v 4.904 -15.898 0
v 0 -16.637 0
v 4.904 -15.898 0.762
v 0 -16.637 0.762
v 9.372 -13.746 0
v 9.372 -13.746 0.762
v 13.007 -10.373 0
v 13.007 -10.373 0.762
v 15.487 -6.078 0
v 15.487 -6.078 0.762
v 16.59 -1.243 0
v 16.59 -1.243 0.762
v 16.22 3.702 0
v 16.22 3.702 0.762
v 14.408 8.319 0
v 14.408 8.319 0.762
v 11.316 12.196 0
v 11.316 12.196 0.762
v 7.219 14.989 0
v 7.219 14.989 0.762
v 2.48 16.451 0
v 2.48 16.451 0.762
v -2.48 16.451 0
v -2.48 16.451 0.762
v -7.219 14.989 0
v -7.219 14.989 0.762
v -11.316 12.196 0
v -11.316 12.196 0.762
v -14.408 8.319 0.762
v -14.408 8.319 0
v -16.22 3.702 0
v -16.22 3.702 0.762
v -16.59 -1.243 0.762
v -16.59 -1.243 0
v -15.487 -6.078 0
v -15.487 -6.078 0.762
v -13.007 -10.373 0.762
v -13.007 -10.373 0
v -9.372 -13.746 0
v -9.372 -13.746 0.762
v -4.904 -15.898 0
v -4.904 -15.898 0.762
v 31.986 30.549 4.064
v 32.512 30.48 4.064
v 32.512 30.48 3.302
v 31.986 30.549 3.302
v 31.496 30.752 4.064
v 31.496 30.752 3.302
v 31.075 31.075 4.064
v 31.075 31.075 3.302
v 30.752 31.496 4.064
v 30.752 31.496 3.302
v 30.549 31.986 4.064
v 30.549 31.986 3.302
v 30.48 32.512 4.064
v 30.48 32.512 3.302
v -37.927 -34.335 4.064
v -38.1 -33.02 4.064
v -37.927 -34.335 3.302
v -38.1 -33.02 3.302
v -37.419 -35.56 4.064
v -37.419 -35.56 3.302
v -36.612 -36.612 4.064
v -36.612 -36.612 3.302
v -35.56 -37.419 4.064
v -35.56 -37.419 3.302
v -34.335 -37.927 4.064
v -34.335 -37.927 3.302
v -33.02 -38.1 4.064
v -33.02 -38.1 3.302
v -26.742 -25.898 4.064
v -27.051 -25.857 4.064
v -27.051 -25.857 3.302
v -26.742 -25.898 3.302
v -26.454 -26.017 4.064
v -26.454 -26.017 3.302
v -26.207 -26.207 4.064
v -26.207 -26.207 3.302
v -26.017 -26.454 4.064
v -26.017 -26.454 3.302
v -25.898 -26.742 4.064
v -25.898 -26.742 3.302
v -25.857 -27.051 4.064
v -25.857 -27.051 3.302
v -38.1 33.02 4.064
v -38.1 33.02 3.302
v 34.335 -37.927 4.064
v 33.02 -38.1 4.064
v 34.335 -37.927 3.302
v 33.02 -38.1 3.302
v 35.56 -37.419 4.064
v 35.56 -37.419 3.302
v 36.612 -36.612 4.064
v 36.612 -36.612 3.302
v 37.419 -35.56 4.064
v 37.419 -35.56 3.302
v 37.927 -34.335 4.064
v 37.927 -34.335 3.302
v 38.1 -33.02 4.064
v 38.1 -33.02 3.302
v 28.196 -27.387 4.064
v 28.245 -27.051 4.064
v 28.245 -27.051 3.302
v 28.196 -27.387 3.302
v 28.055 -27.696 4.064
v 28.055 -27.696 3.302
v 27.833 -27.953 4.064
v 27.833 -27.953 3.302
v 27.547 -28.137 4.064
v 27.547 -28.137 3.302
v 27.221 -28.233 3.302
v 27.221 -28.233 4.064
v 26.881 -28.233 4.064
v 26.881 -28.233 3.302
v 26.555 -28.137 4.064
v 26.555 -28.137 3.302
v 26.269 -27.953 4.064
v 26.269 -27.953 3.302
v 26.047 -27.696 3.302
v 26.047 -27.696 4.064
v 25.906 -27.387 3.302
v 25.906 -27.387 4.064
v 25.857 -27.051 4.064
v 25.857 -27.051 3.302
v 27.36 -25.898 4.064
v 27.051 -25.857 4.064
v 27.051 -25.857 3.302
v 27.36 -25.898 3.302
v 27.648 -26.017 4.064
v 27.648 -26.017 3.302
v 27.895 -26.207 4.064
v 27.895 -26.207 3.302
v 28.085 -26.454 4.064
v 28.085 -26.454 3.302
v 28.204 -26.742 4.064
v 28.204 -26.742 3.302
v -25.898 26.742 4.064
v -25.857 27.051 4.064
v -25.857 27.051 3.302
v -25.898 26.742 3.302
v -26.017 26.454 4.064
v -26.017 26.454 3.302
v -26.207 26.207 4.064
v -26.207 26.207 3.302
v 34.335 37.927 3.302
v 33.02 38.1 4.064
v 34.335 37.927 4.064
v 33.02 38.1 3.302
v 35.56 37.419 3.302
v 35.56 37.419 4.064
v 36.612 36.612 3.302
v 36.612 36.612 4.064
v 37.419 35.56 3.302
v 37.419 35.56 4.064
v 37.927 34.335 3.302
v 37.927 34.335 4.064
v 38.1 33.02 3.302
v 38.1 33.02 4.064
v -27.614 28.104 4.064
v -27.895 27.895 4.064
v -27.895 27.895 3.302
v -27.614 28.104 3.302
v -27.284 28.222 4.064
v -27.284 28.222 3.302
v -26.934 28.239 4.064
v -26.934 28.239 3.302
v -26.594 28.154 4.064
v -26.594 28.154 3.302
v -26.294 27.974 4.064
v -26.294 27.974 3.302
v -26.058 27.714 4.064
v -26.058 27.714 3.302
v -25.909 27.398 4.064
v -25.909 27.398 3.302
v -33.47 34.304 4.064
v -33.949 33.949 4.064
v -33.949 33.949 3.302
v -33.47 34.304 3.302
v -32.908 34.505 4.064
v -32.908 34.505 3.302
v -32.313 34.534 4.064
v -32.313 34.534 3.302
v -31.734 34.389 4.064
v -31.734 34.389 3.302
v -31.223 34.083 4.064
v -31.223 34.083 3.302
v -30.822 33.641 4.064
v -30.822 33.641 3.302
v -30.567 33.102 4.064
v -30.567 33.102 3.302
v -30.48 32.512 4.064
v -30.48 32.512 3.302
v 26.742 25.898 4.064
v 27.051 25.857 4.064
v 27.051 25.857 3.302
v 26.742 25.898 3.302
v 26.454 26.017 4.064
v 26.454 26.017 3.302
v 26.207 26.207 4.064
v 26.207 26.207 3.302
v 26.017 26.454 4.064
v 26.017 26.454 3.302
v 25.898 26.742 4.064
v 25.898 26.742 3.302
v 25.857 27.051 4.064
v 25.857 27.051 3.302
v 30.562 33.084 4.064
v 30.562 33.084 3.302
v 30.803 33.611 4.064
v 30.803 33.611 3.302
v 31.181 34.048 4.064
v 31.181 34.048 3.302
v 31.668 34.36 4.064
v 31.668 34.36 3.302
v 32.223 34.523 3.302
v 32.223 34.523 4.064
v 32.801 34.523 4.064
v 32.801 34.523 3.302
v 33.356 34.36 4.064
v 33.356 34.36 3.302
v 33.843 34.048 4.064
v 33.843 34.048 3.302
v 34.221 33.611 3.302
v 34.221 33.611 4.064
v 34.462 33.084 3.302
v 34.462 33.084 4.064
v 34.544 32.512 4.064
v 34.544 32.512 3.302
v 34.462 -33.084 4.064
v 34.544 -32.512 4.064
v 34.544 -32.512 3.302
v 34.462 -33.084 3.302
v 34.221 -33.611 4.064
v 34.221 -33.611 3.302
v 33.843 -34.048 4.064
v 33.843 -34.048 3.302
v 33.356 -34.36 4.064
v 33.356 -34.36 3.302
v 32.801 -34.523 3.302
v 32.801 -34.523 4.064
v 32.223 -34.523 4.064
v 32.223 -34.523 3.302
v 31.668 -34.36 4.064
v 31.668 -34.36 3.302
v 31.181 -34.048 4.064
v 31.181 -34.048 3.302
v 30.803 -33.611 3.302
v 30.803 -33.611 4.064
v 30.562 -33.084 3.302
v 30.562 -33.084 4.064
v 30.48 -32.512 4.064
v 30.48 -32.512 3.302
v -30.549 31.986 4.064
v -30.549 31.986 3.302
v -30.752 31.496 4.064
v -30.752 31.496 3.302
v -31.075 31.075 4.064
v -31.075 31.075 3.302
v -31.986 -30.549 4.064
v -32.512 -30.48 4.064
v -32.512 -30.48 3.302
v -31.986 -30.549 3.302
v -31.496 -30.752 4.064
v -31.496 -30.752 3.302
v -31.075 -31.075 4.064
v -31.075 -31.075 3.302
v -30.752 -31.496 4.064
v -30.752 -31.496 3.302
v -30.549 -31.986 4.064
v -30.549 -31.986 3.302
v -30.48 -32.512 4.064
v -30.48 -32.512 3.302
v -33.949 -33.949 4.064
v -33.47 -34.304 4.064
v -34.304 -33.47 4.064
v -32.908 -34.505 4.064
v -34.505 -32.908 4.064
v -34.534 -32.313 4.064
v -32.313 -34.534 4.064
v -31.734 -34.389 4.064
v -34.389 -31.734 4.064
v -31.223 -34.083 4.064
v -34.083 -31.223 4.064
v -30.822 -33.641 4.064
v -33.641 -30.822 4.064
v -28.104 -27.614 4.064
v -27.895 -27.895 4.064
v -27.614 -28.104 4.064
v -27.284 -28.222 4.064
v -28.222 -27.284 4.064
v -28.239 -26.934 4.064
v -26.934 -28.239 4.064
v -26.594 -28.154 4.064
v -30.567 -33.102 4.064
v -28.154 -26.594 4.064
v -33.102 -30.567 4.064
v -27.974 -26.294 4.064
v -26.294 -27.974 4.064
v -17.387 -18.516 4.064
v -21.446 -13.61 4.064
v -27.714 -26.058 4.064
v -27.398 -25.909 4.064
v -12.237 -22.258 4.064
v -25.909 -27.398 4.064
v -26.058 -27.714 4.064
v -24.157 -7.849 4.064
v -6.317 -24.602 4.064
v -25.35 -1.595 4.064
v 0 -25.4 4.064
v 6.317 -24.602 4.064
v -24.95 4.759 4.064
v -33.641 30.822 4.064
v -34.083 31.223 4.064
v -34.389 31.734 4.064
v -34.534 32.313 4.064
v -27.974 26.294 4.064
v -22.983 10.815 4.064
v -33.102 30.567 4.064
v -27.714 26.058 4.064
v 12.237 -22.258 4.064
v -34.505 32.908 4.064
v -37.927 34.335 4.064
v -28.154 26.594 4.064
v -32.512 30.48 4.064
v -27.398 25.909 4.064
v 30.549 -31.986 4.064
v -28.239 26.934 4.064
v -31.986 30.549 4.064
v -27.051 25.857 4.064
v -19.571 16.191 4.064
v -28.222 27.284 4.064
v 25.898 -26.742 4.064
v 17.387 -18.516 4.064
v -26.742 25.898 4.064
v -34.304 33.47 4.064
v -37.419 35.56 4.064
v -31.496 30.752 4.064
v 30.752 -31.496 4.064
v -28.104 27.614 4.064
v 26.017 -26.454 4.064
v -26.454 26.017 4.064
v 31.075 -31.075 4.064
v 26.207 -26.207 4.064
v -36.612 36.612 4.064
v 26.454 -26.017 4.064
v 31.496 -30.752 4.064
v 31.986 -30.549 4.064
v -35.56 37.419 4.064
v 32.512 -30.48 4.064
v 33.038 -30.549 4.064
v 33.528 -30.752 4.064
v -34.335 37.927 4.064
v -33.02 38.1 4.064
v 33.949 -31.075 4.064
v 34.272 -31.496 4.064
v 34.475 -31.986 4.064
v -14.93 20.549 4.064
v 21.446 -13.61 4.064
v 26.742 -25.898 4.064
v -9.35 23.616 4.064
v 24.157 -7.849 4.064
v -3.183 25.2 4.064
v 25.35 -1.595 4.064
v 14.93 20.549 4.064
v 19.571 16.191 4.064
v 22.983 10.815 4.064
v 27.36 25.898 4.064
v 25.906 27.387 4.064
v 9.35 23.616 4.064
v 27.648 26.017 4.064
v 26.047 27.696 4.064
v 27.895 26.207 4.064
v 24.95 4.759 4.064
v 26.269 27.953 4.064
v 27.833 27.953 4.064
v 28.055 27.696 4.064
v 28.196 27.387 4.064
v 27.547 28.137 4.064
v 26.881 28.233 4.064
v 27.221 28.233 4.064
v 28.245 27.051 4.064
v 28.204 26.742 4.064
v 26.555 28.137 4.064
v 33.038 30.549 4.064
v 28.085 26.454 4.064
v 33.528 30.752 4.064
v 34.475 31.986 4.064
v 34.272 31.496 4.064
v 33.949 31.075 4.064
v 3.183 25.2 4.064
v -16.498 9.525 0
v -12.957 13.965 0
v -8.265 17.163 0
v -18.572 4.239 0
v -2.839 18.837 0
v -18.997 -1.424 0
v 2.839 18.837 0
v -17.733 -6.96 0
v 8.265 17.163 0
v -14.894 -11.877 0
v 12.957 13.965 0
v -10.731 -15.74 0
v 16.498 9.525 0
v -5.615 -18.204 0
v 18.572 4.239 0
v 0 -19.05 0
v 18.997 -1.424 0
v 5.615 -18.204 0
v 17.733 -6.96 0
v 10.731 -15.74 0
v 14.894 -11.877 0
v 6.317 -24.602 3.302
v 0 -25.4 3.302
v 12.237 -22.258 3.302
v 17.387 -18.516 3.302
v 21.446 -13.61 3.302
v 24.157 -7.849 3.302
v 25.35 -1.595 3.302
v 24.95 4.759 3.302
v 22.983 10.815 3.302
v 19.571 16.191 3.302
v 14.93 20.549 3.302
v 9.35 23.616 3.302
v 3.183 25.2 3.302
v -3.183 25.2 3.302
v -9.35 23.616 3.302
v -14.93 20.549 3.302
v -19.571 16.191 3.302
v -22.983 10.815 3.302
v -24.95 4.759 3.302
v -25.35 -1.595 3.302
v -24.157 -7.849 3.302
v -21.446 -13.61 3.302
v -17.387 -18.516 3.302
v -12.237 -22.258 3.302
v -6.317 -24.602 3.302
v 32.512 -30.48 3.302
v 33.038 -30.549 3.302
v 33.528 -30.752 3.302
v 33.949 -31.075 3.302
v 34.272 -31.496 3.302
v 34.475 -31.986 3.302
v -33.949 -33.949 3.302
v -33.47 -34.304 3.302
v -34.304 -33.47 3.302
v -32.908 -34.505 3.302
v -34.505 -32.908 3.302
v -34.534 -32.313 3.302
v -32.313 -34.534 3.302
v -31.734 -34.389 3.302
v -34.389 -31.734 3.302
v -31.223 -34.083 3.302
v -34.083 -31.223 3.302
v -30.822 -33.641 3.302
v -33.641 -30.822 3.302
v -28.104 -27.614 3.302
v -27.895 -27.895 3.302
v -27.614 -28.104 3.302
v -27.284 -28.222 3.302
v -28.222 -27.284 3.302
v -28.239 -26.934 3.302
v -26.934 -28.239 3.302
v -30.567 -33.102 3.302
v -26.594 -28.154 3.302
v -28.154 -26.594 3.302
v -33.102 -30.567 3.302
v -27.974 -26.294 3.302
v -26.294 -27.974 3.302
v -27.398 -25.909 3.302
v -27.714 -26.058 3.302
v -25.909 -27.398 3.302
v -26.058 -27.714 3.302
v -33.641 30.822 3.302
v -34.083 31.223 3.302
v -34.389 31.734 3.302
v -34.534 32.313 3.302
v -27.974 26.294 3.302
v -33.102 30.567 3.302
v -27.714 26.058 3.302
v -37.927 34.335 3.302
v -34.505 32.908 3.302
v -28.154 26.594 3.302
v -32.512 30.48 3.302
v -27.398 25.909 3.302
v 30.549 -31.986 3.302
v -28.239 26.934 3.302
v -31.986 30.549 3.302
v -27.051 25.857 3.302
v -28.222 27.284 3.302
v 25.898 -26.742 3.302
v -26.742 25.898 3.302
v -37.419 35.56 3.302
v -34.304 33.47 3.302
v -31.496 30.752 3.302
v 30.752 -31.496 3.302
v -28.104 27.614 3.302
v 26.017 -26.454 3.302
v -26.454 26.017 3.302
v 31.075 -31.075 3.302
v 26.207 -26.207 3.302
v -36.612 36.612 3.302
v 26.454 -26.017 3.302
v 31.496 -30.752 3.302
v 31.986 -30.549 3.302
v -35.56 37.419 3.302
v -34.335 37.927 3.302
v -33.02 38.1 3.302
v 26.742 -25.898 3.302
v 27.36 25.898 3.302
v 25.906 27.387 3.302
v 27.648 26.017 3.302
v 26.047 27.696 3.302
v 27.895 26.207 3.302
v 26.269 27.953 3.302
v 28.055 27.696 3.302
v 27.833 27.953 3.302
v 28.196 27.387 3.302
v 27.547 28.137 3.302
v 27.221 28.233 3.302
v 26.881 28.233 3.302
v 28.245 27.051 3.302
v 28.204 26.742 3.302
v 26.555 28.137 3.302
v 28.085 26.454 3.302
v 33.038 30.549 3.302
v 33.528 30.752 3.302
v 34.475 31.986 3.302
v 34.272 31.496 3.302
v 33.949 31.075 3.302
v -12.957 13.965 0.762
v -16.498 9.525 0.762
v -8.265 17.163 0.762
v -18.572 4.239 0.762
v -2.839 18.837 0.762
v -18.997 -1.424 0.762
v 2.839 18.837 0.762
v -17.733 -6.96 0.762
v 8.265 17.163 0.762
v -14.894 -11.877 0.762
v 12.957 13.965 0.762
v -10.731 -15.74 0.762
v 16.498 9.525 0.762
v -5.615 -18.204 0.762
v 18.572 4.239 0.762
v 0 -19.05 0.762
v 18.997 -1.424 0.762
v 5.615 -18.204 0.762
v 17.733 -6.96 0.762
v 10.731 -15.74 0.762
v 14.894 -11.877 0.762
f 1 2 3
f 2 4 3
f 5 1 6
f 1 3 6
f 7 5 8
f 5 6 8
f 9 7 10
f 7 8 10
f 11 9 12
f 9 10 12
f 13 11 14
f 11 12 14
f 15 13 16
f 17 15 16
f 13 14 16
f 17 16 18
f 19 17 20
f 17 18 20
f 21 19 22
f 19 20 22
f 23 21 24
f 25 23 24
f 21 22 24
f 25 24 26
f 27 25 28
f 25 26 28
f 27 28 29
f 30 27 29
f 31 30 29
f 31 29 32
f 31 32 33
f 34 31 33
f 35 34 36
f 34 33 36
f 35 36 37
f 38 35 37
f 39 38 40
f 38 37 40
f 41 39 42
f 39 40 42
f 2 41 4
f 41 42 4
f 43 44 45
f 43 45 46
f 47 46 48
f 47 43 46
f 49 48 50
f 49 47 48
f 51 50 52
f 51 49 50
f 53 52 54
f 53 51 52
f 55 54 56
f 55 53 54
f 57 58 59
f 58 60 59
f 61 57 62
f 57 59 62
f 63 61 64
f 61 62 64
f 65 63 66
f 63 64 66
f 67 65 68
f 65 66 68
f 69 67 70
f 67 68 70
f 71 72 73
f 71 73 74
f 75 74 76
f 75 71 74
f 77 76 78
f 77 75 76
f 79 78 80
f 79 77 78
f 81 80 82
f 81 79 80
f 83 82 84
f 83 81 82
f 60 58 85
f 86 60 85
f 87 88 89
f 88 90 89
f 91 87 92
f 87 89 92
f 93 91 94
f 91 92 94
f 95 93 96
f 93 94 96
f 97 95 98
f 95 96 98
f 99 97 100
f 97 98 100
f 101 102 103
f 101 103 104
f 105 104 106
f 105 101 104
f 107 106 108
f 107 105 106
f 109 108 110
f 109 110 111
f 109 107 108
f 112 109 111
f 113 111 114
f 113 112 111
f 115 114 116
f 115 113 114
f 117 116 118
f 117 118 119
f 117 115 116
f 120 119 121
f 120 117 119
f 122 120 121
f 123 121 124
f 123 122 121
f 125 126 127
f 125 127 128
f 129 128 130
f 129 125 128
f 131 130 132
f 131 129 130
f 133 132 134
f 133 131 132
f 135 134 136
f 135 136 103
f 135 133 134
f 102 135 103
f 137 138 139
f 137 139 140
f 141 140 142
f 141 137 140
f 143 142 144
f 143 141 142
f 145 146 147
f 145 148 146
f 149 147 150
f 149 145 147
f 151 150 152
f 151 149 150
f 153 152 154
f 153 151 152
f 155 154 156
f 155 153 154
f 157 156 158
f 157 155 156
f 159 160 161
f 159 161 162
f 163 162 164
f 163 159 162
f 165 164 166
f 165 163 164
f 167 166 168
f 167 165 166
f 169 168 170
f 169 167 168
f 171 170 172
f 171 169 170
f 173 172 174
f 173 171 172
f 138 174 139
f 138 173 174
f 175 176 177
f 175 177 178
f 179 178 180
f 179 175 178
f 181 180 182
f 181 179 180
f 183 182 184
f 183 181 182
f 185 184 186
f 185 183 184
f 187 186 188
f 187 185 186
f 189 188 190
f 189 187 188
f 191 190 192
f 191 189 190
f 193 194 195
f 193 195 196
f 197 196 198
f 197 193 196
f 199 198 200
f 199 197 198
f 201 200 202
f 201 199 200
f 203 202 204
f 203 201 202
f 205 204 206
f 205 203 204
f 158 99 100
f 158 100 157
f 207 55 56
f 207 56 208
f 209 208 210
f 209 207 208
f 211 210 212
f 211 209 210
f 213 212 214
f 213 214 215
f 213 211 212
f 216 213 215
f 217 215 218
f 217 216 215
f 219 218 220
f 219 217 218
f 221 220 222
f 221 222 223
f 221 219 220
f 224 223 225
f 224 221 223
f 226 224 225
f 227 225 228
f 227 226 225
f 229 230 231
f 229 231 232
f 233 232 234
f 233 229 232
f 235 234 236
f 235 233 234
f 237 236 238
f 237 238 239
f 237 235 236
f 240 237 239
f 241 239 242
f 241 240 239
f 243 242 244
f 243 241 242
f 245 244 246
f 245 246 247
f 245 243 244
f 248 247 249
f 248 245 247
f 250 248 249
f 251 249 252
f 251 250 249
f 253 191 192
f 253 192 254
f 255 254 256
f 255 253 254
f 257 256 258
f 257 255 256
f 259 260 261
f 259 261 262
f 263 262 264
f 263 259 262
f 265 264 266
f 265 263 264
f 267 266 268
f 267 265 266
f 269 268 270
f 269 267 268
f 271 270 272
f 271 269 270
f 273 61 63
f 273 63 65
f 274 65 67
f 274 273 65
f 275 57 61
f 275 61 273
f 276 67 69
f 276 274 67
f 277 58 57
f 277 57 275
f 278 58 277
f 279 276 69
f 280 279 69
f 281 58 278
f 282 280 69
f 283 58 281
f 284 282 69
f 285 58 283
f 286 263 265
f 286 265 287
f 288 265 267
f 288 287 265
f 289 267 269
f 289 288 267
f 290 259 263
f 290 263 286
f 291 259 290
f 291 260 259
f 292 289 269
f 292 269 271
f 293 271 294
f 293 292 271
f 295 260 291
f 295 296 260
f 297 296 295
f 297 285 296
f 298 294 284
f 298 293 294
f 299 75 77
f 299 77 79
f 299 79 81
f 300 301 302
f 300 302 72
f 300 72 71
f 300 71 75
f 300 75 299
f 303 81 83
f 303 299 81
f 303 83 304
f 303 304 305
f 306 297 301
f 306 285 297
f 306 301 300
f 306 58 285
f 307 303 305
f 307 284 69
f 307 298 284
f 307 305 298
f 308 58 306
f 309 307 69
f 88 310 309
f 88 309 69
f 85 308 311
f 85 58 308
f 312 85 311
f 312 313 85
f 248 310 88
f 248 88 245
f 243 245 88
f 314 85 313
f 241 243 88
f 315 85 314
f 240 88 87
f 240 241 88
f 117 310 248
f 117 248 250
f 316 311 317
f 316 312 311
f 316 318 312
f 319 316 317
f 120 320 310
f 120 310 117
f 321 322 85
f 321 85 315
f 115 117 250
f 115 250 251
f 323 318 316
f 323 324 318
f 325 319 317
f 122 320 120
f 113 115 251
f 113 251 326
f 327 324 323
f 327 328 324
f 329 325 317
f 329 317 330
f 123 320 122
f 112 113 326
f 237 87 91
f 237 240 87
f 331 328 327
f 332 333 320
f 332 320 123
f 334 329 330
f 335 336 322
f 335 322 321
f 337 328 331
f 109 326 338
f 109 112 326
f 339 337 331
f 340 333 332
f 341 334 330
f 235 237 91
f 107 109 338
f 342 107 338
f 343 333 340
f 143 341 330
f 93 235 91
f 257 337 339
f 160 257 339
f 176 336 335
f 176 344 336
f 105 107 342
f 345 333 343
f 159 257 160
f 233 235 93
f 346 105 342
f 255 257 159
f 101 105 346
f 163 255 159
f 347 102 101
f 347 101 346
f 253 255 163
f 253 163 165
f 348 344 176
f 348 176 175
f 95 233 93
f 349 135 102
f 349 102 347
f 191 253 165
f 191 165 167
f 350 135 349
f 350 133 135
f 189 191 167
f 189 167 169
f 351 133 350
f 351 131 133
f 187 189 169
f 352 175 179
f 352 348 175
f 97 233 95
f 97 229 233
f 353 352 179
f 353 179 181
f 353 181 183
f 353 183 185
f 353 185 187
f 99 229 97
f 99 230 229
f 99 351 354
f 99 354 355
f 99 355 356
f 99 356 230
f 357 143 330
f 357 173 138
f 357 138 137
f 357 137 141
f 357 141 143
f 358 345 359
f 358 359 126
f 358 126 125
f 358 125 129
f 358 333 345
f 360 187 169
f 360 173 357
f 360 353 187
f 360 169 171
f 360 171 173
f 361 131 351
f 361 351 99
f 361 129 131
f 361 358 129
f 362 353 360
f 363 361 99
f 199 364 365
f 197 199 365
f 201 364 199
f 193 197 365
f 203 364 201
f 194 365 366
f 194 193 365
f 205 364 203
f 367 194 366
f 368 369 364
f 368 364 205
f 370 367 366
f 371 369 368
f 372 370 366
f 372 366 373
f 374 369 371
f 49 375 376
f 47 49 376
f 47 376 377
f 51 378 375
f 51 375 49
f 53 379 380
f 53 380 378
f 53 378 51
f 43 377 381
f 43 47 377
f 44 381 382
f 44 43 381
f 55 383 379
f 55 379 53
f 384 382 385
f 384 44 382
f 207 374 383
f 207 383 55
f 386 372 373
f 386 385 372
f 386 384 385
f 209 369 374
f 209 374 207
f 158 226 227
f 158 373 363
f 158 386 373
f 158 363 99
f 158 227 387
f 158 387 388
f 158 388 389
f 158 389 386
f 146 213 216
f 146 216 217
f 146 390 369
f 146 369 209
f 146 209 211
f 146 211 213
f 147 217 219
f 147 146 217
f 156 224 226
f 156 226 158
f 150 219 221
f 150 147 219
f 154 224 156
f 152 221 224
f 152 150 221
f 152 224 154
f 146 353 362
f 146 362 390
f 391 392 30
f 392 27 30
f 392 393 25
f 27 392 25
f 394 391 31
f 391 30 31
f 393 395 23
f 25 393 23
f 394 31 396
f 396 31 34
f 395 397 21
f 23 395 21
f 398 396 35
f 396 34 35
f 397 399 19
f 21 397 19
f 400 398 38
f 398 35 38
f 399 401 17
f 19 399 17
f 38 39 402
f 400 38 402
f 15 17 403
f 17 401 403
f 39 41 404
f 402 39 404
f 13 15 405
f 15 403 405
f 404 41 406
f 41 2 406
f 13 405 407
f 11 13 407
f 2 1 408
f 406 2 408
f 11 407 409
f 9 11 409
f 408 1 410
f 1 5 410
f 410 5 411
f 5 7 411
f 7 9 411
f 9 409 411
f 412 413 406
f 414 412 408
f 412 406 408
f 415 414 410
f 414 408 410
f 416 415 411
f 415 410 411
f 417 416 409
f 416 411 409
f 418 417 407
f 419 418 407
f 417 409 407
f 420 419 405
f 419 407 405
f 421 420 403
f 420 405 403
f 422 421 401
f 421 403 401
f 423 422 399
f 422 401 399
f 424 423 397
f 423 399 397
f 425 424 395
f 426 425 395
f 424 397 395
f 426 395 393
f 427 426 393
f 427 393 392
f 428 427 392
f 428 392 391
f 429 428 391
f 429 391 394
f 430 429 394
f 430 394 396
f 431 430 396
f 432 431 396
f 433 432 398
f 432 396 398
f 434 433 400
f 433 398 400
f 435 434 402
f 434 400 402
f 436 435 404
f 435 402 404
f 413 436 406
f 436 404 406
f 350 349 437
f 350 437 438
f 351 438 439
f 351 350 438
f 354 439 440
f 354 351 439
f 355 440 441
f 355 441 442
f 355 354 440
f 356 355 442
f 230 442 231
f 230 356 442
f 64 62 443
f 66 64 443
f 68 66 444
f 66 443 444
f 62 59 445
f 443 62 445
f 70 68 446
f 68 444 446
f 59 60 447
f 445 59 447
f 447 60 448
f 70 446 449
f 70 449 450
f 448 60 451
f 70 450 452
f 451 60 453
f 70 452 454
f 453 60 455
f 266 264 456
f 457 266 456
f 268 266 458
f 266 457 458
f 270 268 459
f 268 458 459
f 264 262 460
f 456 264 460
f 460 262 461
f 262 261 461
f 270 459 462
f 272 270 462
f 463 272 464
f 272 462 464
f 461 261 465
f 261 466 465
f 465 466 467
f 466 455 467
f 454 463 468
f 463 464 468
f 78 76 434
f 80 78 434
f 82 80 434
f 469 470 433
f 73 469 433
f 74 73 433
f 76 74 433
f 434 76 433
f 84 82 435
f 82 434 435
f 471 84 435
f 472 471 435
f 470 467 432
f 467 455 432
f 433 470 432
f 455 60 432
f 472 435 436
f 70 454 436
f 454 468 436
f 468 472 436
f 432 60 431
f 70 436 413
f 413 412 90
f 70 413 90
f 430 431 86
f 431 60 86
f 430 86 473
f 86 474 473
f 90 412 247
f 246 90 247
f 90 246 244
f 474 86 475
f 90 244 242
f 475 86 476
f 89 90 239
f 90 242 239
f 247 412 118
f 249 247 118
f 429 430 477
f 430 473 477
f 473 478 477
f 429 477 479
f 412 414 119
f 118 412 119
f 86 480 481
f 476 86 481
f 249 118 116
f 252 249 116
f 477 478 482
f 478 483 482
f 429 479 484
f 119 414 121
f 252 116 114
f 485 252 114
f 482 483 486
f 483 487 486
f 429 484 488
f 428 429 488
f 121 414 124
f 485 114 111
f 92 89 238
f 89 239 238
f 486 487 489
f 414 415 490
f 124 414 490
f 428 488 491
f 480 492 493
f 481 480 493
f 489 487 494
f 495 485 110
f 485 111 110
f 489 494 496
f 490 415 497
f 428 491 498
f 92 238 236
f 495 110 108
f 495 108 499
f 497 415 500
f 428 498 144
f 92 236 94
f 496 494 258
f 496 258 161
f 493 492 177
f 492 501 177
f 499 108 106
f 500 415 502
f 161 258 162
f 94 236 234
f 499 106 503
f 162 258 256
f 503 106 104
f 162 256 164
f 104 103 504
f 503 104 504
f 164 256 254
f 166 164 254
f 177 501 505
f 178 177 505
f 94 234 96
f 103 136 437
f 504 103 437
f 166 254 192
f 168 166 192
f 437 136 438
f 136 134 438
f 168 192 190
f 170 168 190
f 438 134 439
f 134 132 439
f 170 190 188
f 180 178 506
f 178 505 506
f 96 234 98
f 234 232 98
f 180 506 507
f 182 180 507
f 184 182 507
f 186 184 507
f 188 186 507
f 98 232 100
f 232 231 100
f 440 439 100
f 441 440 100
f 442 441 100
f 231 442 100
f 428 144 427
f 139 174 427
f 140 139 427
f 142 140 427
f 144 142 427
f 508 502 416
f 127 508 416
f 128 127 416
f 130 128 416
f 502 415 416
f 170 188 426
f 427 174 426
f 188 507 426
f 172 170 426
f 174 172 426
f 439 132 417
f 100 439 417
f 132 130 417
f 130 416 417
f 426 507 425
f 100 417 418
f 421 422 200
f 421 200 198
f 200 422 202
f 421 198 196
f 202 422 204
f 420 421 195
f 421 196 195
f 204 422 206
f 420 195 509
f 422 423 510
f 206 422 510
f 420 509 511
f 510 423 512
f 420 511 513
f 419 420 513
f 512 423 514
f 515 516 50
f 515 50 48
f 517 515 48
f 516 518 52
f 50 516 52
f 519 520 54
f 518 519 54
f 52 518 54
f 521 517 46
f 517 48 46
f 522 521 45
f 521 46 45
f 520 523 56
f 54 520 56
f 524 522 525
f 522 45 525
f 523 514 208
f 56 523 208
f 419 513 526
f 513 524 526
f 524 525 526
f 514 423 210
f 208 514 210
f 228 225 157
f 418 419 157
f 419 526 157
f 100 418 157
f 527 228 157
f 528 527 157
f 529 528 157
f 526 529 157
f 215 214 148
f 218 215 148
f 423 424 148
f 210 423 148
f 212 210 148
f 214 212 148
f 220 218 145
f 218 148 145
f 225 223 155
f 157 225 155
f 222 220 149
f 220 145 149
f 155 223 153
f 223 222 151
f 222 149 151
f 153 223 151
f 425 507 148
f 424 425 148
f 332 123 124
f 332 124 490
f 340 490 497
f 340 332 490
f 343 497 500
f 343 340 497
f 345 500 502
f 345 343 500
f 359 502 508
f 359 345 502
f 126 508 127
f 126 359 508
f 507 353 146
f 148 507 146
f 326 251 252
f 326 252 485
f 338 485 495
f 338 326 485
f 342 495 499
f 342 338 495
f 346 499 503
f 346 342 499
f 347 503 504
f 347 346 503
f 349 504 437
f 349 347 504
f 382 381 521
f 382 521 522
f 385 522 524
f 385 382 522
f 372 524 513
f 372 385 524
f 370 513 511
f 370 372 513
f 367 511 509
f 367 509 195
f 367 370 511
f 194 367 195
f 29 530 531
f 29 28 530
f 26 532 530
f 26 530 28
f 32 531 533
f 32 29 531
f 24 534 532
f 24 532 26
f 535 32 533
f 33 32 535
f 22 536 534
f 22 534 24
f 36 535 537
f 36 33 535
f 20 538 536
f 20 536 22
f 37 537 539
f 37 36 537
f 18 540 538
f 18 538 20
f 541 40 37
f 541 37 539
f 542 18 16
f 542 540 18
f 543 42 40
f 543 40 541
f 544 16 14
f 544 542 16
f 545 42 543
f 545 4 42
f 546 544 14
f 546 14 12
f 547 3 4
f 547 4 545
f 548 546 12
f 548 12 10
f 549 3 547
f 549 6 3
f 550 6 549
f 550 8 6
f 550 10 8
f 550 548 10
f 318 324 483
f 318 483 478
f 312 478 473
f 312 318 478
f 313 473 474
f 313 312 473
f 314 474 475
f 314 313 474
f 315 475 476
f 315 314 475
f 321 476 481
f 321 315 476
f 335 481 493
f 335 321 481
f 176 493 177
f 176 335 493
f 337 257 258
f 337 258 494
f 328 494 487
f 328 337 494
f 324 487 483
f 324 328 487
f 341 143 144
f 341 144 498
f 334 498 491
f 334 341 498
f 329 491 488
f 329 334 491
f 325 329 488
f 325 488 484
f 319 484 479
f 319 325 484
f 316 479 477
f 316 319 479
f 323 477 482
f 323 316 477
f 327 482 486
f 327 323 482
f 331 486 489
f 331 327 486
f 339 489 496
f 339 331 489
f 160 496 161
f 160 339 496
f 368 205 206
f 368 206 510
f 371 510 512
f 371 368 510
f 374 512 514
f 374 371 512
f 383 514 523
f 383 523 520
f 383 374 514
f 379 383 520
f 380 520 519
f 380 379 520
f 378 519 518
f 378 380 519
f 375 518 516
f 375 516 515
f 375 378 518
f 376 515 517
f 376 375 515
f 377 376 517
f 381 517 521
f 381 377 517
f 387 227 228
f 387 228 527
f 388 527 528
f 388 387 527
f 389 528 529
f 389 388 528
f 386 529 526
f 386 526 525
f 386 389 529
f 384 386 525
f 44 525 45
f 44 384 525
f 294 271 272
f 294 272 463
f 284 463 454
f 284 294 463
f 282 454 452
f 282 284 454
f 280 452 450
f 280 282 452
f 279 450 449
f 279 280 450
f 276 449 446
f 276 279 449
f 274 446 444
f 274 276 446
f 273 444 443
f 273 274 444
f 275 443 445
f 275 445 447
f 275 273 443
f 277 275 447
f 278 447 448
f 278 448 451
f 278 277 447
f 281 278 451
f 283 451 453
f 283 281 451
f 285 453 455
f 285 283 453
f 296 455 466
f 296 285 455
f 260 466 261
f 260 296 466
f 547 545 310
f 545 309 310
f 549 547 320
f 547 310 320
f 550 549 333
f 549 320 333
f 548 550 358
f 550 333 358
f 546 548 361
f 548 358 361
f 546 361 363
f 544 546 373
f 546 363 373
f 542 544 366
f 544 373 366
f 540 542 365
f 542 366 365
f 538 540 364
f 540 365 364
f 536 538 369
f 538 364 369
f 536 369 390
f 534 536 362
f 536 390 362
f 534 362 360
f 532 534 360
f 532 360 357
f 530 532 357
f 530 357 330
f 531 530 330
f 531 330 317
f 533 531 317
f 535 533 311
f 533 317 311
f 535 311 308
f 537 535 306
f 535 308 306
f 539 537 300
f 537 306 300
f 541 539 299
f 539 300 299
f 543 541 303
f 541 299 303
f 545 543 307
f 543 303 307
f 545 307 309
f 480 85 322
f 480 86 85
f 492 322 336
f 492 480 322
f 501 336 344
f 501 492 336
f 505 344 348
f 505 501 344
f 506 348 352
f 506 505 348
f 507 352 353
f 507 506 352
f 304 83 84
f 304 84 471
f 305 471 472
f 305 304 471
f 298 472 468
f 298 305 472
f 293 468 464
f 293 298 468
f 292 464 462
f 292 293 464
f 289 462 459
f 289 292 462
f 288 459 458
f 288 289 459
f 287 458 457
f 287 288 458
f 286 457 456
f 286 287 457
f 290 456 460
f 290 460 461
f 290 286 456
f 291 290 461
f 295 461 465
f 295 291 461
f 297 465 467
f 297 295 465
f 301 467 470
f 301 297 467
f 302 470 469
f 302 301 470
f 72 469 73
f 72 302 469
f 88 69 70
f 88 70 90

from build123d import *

# Parameters (mm, degrees)
F0_W     = 5.08
F0_H     = 0.762
F0_W_2   = 2.413
F2_W     = 76.2
F2_H     = 76.2
F3_DEPTH = 0.762
F4_R     = 5.08


with BuildPart() as f1:
    # F0 (on Right) → F1 (revolve)
    with BuildSketch(Plane.YZ):
        with Locations((-27.94, 3.683)):
            Rectangle(F0_W, F0_H)
        Polygon((-25.4, 3.302), (-19.05, 0), (-19.05, 0.762), (-25.4, 4.064), align=None)
        with Locations((-17.8435, 0.381)):
            Rectangle(F0_W_2, F0_H)
    revolve(axis=Axis((0, 0, 0.2757511821), (0, 0, 1)))

    # F2 (on face) → F3 (join, through all)
    with BuildSketch(Plane.XY.offset(4.064)):
        Rectangle(F2_W, F2_H)
        with BuildLine():
            ThreePointArc((-32.512, 30.48), (-34.3893232101, 31.7343872654), (-33.9488409794, 33.9488409794))
            ThreePointArc((-33.9488409794, 33.9488409794), (-31.7343872654, 34.3893232101), (-30.48, 32.512))
            Line((-30.48, 32.512), (30.48, 32.512))
            ThreePointArc((30.48, 32.512), (32.512, 34.544), (34.544, 32.512))
            ThreePointArc((34.544, 32.512), (33.9488409794, 31.0751590206), (32.512, 30.48))
            Line((32.512, 30.48), (32.512, -30.48))
            ThreePointArc((32.512, -30.48), (33.9488409794, -31.0751590206), (34.544, -32.512))
            ThreePointArc((34.544, -32.512), (32.512, -34.544), (30.48, -32.512))
            Line((30.48, -32.512), (-30.48, -32.512))
            ThreePointArc((-30.48, -32.512), (-33.9488409794, -33.9488409794), (-32.512, -30.48))
            Line((-32.512, -30.48), (-32.512, 30.48))
        make_face(mode=Mode.SUBTRACT)
        with BuildLine():
            Line((30.48, 32.512), (-30.48, 32.512))
            ThreePointArc((-30.48, 32.512), (-30.6346767899, 31.7343872654), (-31.0751590206, 31.0751590206))
            ThreePointArc((-31.0751590206, 31.0751590206), (-31.7343872654, 30.6346767899), (-32.512, 30.48))
            Line((-32.512, 30.48), (-32.512, -30.48))
            ThreePointArc((-32.512, -30.48), (-31.0751590206, -31.0751590206), (-30.48, -32.512))
            Line((-30.48, -32.512), (30.48, -32.512))
            ThreePointArc((30.48, -32.512), (31.0751590206, -31.0751590206), (32.512, -30.48))
            Line((32.512, -30.48), (32.512, 30.48))
            ThreePointArc((32.512, 30.48), (31.0751590206, 31.0751590206), (30.48, 32.512))
        make_face()
        with BuildLine():
            ThreePointArc((-27.051, 25.8572), (-28.1539273859, 26.5941525184), (-27.8951440754, 27.8951440754))
            ThreePointArc((-27.8951440754, 27.8951440754), (-26.5941525184, 28.1539273859), (-25.8572, 27.051))
            Line((-25.8572, 27.051), (-14.0454191465, 27.051))
            ThreePointArc((-14.0454191465, 27.051), (0, 30.48), (14.0454191465, 27.051))
            Line((14.0454191465, 27.051), (25.8572, 27.051))
            ThreePointArc((25.8572, 27.051), (27.051, 28.2448), (28.2448, 27.051))
            ThreePointArc((28.2448, 27.051), (27.8951440754, 26.2068559246), (27.051, 25.8572))
            Line((27.051, 25.8572), (27.051, 14.0454191465))
            ThreePointArc((27.051, 14.0454191465), (29.6103434631, 7.2289667311), (30.48, 0))
            ThreePointArc((30.48, 0), (29.6103434631, -7.2289667311), (27.051, -14.0454191465))
            Line((27.051, -14.0454191465), (27.051, -25.8572))
            ThreePointArc((27.051, -25.8572), (27.8951440754, -26.2068559246), (28.2448, -27.051))
            ThreePointArc((28.2448, -27.051), (27.051, -28.2448), (25.8572, -27.051))
            Line((25.8572, -27.051), (14.0454191465, -27.051))
            ThreePointArc((14.0454191465, -27.051), (0, -30.48), (-14.0454191465, -27.051))
            Line((-14.0454191465, -27.051), (-25.8572, -27.051))
            ThreePointArc((-25.8572, -27.051), (-27.8951440754, -27.8951440754), (-27.051, -25.8572))
            Line((-27.051, -25.8572), (-27.051, -14.0454191465))
            ThreePointArc((-27.051, -14.0454191465), (-30.48, 0), (-27.051, 14.0454191465))
            Line((-27.051, 14.0454191465), (-27.051, 25.8572))
        make_face(mode=Mode.SUBTRACT)
        with BuildLine():
            Line((27.051, -25.8572), (27.051, -14.0454191465))
            ThreePointArc((27.051, -14.0454191465), (21.5526146906, -21.5526146906), (14.0454191465, -27.051))
            Line((14.0454191465, -27.051), (25.8572, -27.051))
            ThreePointArc((25.8572, -27.051), (26.2068559246, -26.2068559246), (27.051, -25.8572))
        make_face()
        with BuildLine():
            Line((25.8572, 27.051), (14.0454191465, 27.051))
            ThreePointArc((14.0454191465, 27.051), (21.5526146906, 21.5526146906), (27.051, 14.0454191465))
            Line((27.051, 14.0454191465), (27.051, 25.8572))
            ThreePointArc((27.051, 25.8572), (26.2068559246, 26.2068559246), (25.8572, 27.051))
        make_face()
        with BuildLine():
            ThreePointArc((-14.0454191465, -27.051), (-21.5526146906, -21.5526146906), (-27.051, -14.0454191465))
            Line((-27.051, -14.0454191465), (-27.051, -25.8572))
            ThreePointArc((-27.051, -25.8572), (-26.2068559246, -26.2068559246), (-25.8572, -27.051))
            Line((-25.8572, -27.051), (-14.0454191465, -27.051))
        make_face()
        with BuildLine():
            ThreePointArc((-26.2068559246, 26.2068559246), (-26.5941525184, 25.9480726141), (-27.051, 25.8572))
            Line((-27.051, 25.8572), (-27.051, 14.0454191465))
            ThreePointArc((-27.051, 14.0454191465), (-24.589984475, 18.0100822741), (-21.5526146906, 21.5526146906))
            Line((-21.5526146906, 21.5526146906), (-26.2068559246, 26.2068559246))
        make_face()
        with BuildLine():
            Line((-14.0454191465, 27.051), (-25.8572, 27.051))
            ThreePointArc((-25.8572, 27.051), (-25.9480726141, 26.5941525184), (-26.2068559246, 26.2068559246))
            Line((-26.2068559246, 26.2068559246), (-21.5526146906, 21.5526146906))
            ThreePointArc((-21.5526146906, 21.5526146906), (-18.0100822741, 24.589984475), (-14.0454191465, 27.051))
        make_face()
    extrude(amount=-F3_DEPTH)

    # F4
    f4_edges = [f1.edges().sort_by_distance(p)[0] for p in [
        (-38.1, -38.1, 3.683),
        (38.1, -38.1, 3.683),
        (-38.1, 38.1, 3.683),
        (38.1, 38.1, 3.683),
    ]]
    fillet(f4_edges, radius=F4_R)


solid = f1.part
